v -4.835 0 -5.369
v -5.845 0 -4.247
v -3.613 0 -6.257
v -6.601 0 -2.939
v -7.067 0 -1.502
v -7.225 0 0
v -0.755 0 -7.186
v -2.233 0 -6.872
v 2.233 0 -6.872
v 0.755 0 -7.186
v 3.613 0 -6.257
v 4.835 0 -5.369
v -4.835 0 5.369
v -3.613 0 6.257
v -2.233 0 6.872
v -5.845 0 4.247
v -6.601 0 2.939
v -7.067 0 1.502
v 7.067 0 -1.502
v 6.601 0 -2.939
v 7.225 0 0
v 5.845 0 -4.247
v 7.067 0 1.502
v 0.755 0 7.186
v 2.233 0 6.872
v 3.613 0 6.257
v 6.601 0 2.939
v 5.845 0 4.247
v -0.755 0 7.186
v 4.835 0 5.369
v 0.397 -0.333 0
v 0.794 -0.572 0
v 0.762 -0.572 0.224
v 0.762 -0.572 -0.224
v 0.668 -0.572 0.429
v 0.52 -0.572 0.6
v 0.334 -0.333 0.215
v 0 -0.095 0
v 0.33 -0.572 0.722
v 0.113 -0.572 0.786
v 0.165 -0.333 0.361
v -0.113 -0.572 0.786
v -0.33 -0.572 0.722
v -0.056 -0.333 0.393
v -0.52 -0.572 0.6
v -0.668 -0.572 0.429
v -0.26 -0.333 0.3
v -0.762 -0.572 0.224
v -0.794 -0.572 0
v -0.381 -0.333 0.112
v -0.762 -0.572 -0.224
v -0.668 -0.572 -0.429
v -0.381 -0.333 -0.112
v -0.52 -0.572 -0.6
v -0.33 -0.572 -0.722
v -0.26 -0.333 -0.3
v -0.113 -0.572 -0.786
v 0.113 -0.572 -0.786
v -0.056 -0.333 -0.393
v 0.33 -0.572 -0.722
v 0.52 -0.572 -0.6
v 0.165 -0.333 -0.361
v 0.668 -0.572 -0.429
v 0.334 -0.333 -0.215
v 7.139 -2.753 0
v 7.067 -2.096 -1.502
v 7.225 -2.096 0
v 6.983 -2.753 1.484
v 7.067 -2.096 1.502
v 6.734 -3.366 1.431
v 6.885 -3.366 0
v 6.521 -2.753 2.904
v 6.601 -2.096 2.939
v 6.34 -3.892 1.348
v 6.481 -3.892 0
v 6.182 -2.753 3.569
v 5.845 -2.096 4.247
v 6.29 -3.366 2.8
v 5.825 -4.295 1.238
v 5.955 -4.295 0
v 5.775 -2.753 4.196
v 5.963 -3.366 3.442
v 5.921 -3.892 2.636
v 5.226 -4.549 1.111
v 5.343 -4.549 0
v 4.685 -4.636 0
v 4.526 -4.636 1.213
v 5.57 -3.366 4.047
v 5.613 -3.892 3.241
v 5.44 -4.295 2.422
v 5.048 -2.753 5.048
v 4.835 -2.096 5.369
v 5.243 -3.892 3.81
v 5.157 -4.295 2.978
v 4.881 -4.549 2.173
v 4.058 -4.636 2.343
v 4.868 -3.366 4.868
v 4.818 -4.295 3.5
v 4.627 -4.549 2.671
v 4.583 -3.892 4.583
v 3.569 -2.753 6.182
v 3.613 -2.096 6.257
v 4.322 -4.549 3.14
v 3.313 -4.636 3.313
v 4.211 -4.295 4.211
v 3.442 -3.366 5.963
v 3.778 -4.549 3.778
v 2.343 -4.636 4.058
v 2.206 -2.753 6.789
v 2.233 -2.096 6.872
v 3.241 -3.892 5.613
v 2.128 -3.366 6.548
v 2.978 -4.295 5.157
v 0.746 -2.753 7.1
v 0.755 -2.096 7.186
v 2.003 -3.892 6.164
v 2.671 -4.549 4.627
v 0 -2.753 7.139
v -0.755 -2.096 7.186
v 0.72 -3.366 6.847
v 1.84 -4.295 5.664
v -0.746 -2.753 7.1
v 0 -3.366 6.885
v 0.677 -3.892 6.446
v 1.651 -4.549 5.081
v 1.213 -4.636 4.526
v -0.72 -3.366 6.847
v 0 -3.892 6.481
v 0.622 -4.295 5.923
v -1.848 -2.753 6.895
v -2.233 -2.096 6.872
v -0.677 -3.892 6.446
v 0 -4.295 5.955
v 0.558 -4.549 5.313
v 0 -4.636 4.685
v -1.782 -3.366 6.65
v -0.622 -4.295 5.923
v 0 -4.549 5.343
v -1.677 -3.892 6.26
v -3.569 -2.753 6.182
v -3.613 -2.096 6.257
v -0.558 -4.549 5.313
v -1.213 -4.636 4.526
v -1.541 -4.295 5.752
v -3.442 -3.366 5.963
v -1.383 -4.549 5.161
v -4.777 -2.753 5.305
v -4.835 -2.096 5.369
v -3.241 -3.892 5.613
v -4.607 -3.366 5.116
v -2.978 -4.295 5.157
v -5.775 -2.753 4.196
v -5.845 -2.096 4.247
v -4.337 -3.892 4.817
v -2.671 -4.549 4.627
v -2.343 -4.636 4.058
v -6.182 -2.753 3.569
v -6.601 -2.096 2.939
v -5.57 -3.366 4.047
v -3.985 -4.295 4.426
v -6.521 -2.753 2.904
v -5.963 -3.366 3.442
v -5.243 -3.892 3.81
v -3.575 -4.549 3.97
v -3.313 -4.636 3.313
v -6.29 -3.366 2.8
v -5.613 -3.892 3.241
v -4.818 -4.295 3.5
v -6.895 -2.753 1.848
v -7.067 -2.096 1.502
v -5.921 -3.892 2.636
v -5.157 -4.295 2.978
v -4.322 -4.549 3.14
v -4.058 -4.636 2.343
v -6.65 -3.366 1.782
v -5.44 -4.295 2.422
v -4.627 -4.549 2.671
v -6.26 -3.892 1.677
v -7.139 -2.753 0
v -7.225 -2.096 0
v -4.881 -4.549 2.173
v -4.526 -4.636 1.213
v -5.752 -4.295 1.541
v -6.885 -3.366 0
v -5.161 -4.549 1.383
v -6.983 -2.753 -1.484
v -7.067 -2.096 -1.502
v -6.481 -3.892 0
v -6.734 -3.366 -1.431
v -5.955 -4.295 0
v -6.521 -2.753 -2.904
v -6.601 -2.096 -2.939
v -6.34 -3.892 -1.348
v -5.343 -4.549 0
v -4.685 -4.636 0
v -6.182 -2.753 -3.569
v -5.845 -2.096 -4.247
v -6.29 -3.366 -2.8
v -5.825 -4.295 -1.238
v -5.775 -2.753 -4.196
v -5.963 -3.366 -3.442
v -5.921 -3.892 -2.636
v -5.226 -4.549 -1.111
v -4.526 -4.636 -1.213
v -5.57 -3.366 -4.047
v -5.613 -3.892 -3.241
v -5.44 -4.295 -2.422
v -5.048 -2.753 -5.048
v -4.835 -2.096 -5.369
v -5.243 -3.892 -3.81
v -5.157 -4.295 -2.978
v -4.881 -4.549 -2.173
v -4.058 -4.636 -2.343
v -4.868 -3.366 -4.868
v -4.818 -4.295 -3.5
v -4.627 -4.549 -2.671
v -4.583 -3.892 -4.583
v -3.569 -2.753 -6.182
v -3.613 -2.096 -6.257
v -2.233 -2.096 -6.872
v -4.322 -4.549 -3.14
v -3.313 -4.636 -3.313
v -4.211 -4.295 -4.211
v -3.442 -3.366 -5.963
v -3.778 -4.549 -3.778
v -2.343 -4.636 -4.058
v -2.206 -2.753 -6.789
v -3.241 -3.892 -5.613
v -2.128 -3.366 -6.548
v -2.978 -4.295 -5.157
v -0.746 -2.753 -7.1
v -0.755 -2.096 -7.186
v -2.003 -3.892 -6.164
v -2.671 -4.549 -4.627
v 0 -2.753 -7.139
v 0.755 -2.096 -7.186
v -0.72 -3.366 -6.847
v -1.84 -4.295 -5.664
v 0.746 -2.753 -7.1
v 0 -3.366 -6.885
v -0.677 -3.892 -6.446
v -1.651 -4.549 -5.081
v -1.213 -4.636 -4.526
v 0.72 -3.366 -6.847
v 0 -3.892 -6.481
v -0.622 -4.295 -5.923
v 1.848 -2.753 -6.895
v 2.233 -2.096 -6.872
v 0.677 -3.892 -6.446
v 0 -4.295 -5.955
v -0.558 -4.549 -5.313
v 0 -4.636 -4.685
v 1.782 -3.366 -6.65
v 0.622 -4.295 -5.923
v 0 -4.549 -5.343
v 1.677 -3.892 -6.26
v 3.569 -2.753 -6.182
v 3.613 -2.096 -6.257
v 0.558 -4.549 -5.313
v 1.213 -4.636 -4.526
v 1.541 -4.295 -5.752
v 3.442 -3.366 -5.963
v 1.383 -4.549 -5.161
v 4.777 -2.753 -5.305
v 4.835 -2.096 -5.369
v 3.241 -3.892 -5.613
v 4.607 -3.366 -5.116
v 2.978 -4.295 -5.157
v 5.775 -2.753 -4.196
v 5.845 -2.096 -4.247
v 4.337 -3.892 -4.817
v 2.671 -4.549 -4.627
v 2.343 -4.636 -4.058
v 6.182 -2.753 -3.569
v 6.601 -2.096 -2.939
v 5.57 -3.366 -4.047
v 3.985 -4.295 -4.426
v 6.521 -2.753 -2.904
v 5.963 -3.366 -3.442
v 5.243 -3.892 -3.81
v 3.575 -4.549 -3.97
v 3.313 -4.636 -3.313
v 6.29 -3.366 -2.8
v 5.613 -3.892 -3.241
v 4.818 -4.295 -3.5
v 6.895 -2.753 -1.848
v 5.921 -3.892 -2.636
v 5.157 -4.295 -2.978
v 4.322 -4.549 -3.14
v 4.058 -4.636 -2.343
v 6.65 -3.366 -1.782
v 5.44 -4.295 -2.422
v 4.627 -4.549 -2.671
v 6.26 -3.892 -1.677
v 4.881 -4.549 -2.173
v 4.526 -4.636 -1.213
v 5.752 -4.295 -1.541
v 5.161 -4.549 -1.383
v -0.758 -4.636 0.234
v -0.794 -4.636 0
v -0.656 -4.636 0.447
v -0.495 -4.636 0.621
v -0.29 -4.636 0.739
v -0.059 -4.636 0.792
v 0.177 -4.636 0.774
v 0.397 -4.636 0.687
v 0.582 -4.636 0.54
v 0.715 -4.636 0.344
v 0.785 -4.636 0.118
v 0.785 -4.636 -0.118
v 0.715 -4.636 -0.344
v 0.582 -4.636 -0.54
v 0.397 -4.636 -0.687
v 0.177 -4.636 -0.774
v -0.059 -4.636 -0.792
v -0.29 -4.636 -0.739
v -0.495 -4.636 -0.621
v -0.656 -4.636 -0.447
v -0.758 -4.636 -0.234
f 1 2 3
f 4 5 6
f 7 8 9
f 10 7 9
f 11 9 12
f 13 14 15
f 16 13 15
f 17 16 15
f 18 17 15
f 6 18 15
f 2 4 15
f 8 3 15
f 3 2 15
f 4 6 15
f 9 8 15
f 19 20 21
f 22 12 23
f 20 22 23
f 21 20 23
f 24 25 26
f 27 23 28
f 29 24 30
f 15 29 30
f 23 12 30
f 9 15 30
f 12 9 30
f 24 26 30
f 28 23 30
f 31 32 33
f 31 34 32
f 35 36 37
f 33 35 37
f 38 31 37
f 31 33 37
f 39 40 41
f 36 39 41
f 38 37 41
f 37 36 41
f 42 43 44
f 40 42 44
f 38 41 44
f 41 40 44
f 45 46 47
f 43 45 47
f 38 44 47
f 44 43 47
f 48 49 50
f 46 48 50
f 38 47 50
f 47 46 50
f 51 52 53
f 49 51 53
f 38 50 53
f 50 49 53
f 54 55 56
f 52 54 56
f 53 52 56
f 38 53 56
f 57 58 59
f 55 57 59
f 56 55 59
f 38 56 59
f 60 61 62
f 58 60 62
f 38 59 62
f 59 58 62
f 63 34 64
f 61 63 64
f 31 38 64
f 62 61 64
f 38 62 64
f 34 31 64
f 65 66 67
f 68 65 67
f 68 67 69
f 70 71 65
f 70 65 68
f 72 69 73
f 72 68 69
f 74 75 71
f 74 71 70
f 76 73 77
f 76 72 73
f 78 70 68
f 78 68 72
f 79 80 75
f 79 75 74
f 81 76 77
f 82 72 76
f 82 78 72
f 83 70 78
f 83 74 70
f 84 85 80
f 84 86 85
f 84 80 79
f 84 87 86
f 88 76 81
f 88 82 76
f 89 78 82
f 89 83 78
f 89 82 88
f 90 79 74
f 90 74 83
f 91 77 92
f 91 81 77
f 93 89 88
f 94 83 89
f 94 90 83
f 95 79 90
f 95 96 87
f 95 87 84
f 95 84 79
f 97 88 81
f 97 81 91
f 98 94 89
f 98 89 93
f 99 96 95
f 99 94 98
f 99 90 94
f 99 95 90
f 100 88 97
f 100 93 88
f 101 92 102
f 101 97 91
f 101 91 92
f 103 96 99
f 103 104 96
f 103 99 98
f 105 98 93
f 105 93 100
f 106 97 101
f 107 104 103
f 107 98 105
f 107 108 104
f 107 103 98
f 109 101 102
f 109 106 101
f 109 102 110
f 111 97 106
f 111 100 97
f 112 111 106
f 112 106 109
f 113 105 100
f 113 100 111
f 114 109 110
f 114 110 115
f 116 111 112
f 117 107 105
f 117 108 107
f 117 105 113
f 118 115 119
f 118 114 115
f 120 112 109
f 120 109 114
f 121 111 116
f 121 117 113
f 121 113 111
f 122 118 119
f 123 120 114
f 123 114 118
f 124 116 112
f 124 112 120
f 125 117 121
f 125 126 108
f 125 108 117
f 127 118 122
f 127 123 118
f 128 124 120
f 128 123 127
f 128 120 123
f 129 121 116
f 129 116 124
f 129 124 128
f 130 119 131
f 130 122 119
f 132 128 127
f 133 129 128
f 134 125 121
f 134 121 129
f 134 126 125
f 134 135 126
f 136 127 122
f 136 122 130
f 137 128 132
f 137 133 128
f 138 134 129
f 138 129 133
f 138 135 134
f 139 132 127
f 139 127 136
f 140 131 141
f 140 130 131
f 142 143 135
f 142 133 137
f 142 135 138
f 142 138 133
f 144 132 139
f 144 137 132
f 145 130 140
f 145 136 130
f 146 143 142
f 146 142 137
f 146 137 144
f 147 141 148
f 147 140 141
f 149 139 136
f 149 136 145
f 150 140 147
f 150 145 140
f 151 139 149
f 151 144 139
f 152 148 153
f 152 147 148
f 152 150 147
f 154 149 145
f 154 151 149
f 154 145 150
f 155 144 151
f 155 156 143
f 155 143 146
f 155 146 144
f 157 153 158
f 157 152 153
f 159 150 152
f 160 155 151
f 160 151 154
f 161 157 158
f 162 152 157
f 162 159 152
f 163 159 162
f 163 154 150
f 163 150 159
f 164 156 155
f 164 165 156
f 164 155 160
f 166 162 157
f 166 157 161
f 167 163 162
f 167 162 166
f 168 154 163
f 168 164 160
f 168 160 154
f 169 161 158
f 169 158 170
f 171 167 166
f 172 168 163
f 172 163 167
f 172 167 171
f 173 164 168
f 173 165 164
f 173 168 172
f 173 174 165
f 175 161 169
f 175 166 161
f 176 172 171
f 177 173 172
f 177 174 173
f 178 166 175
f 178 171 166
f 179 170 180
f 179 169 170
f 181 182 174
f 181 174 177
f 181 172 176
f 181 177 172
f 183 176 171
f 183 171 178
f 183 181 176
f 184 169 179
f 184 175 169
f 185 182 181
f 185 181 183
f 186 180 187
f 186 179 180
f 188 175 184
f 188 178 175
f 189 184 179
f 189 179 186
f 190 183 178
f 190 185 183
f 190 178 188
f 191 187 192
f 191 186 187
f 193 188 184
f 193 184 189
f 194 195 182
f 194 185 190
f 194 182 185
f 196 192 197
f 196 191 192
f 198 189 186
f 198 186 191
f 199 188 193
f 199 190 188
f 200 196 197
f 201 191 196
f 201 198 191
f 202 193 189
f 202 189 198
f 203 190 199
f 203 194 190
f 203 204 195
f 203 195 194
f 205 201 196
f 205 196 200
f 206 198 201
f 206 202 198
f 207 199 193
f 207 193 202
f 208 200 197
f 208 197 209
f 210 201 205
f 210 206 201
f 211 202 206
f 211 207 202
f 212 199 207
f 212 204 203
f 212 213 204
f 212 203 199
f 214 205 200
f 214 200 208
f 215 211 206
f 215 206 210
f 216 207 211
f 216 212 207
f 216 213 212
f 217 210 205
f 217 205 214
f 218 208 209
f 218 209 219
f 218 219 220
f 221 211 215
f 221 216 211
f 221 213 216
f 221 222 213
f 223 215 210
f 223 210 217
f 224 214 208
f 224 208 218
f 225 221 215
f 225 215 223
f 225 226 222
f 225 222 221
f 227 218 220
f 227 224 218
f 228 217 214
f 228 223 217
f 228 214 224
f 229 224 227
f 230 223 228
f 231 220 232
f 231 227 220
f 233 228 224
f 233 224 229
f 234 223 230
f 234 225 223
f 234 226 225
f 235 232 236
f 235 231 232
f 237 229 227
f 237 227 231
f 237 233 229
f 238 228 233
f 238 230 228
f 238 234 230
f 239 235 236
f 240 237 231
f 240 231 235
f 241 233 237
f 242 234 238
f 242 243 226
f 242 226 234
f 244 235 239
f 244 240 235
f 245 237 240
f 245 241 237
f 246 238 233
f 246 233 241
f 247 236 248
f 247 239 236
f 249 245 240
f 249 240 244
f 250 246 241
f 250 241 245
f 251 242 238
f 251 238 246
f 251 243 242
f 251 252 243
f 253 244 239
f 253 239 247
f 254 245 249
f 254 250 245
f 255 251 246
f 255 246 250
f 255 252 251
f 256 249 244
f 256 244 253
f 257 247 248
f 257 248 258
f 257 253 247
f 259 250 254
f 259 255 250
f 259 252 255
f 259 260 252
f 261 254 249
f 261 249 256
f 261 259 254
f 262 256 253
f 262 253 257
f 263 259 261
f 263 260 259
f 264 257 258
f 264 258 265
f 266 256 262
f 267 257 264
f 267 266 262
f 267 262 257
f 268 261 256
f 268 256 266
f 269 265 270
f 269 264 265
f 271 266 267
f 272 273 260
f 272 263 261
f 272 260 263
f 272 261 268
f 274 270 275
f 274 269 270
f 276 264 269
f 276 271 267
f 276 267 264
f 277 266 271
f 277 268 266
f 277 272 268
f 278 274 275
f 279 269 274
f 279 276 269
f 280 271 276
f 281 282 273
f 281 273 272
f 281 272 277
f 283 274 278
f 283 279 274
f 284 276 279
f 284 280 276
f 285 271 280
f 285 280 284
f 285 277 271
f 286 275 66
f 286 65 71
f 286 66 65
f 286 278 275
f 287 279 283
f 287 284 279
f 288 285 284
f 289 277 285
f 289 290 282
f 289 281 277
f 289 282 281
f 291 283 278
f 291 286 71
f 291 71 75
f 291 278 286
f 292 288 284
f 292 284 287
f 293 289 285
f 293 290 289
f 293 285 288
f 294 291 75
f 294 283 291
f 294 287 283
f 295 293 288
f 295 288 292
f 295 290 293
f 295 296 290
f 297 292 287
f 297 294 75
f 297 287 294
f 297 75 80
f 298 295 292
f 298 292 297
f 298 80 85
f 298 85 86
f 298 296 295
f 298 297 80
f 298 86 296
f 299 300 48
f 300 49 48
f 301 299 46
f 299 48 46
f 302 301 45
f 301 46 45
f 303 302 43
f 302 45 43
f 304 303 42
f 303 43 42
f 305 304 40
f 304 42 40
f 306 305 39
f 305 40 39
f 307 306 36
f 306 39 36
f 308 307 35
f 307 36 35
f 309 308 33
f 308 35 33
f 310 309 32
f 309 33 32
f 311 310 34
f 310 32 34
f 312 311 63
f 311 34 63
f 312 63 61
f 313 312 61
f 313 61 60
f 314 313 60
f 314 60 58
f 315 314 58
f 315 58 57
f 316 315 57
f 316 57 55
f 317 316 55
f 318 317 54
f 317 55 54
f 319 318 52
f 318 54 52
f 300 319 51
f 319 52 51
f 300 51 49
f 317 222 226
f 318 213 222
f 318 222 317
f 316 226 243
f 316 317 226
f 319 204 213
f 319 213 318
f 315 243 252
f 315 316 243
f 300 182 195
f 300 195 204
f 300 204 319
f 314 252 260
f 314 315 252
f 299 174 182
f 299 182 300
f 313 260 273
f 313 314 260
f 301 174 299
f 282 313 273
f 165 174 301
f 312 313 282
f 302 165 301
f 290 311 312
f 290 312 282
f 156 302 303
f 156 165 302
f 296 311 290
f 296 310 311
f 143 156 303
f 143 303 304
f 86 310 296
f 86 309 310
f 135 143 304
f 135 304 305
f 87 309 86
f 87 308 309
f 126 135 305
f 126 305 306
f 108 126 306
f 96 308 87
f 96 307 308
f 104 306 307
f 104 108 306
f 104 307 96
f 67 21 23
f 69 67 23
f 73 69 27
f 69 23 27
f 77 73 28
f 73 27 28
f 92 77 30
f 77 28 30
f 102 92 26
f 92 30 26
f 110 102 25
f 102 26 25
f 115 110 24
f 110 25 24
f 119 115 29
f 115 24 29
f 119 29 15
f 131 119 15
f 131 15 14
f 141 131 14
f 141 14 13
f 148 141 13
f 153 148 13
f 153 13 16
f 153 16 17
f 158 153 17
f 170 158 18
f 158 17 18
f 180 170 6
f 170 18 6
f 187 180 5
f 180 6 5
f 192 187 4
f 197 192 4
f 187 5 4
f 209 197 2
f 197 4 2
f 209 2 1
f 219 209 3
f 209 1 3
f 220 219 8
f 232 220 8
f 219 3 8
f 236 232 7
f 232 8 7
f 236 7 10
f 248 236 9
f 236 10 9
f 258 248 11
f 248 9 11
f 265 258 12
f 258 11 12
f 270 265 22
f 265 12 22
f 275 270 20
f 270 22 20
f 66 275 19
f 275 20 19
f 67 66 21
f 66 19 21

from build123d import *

# Parameters (mm, degrees)
F0_R     = 7.2252124777
F1_DEPTH = 4.6355
F3_D     = 1.5875
F3_DEPTH = 4.064
F3_TIP   = 0.4769331164
F4_R     = 2.54


with BuildPart() as f1:
    # F0 (on Front) → F1 (new body)
    with BuildSketch(Plane.XZ):
        Circle(F0_R)
    extrude(amount=F1_DEPTH)

    # F3
    with Locations(Plane.XZ.offset(4.6355)):
        with Locations((0, 0)):
            Hole(F3_D / 2, depth=F3_DEPTH)
            with Locations((0, 0, -(F3_DEPTH + F3_TIP / 2))):  # 118° drill point
                Cone(0, F3_D / 2, F3_TIP, mode=Mode.SUBTRACT)

    # F4
    f4_edges = [f1.edges().sort_by_distance(p)[0] for p in [
        (-7.225212, -4.6355, 0),
    ]]
    fillet(f4_edges, radius=F4_R)


solid = f1.part
